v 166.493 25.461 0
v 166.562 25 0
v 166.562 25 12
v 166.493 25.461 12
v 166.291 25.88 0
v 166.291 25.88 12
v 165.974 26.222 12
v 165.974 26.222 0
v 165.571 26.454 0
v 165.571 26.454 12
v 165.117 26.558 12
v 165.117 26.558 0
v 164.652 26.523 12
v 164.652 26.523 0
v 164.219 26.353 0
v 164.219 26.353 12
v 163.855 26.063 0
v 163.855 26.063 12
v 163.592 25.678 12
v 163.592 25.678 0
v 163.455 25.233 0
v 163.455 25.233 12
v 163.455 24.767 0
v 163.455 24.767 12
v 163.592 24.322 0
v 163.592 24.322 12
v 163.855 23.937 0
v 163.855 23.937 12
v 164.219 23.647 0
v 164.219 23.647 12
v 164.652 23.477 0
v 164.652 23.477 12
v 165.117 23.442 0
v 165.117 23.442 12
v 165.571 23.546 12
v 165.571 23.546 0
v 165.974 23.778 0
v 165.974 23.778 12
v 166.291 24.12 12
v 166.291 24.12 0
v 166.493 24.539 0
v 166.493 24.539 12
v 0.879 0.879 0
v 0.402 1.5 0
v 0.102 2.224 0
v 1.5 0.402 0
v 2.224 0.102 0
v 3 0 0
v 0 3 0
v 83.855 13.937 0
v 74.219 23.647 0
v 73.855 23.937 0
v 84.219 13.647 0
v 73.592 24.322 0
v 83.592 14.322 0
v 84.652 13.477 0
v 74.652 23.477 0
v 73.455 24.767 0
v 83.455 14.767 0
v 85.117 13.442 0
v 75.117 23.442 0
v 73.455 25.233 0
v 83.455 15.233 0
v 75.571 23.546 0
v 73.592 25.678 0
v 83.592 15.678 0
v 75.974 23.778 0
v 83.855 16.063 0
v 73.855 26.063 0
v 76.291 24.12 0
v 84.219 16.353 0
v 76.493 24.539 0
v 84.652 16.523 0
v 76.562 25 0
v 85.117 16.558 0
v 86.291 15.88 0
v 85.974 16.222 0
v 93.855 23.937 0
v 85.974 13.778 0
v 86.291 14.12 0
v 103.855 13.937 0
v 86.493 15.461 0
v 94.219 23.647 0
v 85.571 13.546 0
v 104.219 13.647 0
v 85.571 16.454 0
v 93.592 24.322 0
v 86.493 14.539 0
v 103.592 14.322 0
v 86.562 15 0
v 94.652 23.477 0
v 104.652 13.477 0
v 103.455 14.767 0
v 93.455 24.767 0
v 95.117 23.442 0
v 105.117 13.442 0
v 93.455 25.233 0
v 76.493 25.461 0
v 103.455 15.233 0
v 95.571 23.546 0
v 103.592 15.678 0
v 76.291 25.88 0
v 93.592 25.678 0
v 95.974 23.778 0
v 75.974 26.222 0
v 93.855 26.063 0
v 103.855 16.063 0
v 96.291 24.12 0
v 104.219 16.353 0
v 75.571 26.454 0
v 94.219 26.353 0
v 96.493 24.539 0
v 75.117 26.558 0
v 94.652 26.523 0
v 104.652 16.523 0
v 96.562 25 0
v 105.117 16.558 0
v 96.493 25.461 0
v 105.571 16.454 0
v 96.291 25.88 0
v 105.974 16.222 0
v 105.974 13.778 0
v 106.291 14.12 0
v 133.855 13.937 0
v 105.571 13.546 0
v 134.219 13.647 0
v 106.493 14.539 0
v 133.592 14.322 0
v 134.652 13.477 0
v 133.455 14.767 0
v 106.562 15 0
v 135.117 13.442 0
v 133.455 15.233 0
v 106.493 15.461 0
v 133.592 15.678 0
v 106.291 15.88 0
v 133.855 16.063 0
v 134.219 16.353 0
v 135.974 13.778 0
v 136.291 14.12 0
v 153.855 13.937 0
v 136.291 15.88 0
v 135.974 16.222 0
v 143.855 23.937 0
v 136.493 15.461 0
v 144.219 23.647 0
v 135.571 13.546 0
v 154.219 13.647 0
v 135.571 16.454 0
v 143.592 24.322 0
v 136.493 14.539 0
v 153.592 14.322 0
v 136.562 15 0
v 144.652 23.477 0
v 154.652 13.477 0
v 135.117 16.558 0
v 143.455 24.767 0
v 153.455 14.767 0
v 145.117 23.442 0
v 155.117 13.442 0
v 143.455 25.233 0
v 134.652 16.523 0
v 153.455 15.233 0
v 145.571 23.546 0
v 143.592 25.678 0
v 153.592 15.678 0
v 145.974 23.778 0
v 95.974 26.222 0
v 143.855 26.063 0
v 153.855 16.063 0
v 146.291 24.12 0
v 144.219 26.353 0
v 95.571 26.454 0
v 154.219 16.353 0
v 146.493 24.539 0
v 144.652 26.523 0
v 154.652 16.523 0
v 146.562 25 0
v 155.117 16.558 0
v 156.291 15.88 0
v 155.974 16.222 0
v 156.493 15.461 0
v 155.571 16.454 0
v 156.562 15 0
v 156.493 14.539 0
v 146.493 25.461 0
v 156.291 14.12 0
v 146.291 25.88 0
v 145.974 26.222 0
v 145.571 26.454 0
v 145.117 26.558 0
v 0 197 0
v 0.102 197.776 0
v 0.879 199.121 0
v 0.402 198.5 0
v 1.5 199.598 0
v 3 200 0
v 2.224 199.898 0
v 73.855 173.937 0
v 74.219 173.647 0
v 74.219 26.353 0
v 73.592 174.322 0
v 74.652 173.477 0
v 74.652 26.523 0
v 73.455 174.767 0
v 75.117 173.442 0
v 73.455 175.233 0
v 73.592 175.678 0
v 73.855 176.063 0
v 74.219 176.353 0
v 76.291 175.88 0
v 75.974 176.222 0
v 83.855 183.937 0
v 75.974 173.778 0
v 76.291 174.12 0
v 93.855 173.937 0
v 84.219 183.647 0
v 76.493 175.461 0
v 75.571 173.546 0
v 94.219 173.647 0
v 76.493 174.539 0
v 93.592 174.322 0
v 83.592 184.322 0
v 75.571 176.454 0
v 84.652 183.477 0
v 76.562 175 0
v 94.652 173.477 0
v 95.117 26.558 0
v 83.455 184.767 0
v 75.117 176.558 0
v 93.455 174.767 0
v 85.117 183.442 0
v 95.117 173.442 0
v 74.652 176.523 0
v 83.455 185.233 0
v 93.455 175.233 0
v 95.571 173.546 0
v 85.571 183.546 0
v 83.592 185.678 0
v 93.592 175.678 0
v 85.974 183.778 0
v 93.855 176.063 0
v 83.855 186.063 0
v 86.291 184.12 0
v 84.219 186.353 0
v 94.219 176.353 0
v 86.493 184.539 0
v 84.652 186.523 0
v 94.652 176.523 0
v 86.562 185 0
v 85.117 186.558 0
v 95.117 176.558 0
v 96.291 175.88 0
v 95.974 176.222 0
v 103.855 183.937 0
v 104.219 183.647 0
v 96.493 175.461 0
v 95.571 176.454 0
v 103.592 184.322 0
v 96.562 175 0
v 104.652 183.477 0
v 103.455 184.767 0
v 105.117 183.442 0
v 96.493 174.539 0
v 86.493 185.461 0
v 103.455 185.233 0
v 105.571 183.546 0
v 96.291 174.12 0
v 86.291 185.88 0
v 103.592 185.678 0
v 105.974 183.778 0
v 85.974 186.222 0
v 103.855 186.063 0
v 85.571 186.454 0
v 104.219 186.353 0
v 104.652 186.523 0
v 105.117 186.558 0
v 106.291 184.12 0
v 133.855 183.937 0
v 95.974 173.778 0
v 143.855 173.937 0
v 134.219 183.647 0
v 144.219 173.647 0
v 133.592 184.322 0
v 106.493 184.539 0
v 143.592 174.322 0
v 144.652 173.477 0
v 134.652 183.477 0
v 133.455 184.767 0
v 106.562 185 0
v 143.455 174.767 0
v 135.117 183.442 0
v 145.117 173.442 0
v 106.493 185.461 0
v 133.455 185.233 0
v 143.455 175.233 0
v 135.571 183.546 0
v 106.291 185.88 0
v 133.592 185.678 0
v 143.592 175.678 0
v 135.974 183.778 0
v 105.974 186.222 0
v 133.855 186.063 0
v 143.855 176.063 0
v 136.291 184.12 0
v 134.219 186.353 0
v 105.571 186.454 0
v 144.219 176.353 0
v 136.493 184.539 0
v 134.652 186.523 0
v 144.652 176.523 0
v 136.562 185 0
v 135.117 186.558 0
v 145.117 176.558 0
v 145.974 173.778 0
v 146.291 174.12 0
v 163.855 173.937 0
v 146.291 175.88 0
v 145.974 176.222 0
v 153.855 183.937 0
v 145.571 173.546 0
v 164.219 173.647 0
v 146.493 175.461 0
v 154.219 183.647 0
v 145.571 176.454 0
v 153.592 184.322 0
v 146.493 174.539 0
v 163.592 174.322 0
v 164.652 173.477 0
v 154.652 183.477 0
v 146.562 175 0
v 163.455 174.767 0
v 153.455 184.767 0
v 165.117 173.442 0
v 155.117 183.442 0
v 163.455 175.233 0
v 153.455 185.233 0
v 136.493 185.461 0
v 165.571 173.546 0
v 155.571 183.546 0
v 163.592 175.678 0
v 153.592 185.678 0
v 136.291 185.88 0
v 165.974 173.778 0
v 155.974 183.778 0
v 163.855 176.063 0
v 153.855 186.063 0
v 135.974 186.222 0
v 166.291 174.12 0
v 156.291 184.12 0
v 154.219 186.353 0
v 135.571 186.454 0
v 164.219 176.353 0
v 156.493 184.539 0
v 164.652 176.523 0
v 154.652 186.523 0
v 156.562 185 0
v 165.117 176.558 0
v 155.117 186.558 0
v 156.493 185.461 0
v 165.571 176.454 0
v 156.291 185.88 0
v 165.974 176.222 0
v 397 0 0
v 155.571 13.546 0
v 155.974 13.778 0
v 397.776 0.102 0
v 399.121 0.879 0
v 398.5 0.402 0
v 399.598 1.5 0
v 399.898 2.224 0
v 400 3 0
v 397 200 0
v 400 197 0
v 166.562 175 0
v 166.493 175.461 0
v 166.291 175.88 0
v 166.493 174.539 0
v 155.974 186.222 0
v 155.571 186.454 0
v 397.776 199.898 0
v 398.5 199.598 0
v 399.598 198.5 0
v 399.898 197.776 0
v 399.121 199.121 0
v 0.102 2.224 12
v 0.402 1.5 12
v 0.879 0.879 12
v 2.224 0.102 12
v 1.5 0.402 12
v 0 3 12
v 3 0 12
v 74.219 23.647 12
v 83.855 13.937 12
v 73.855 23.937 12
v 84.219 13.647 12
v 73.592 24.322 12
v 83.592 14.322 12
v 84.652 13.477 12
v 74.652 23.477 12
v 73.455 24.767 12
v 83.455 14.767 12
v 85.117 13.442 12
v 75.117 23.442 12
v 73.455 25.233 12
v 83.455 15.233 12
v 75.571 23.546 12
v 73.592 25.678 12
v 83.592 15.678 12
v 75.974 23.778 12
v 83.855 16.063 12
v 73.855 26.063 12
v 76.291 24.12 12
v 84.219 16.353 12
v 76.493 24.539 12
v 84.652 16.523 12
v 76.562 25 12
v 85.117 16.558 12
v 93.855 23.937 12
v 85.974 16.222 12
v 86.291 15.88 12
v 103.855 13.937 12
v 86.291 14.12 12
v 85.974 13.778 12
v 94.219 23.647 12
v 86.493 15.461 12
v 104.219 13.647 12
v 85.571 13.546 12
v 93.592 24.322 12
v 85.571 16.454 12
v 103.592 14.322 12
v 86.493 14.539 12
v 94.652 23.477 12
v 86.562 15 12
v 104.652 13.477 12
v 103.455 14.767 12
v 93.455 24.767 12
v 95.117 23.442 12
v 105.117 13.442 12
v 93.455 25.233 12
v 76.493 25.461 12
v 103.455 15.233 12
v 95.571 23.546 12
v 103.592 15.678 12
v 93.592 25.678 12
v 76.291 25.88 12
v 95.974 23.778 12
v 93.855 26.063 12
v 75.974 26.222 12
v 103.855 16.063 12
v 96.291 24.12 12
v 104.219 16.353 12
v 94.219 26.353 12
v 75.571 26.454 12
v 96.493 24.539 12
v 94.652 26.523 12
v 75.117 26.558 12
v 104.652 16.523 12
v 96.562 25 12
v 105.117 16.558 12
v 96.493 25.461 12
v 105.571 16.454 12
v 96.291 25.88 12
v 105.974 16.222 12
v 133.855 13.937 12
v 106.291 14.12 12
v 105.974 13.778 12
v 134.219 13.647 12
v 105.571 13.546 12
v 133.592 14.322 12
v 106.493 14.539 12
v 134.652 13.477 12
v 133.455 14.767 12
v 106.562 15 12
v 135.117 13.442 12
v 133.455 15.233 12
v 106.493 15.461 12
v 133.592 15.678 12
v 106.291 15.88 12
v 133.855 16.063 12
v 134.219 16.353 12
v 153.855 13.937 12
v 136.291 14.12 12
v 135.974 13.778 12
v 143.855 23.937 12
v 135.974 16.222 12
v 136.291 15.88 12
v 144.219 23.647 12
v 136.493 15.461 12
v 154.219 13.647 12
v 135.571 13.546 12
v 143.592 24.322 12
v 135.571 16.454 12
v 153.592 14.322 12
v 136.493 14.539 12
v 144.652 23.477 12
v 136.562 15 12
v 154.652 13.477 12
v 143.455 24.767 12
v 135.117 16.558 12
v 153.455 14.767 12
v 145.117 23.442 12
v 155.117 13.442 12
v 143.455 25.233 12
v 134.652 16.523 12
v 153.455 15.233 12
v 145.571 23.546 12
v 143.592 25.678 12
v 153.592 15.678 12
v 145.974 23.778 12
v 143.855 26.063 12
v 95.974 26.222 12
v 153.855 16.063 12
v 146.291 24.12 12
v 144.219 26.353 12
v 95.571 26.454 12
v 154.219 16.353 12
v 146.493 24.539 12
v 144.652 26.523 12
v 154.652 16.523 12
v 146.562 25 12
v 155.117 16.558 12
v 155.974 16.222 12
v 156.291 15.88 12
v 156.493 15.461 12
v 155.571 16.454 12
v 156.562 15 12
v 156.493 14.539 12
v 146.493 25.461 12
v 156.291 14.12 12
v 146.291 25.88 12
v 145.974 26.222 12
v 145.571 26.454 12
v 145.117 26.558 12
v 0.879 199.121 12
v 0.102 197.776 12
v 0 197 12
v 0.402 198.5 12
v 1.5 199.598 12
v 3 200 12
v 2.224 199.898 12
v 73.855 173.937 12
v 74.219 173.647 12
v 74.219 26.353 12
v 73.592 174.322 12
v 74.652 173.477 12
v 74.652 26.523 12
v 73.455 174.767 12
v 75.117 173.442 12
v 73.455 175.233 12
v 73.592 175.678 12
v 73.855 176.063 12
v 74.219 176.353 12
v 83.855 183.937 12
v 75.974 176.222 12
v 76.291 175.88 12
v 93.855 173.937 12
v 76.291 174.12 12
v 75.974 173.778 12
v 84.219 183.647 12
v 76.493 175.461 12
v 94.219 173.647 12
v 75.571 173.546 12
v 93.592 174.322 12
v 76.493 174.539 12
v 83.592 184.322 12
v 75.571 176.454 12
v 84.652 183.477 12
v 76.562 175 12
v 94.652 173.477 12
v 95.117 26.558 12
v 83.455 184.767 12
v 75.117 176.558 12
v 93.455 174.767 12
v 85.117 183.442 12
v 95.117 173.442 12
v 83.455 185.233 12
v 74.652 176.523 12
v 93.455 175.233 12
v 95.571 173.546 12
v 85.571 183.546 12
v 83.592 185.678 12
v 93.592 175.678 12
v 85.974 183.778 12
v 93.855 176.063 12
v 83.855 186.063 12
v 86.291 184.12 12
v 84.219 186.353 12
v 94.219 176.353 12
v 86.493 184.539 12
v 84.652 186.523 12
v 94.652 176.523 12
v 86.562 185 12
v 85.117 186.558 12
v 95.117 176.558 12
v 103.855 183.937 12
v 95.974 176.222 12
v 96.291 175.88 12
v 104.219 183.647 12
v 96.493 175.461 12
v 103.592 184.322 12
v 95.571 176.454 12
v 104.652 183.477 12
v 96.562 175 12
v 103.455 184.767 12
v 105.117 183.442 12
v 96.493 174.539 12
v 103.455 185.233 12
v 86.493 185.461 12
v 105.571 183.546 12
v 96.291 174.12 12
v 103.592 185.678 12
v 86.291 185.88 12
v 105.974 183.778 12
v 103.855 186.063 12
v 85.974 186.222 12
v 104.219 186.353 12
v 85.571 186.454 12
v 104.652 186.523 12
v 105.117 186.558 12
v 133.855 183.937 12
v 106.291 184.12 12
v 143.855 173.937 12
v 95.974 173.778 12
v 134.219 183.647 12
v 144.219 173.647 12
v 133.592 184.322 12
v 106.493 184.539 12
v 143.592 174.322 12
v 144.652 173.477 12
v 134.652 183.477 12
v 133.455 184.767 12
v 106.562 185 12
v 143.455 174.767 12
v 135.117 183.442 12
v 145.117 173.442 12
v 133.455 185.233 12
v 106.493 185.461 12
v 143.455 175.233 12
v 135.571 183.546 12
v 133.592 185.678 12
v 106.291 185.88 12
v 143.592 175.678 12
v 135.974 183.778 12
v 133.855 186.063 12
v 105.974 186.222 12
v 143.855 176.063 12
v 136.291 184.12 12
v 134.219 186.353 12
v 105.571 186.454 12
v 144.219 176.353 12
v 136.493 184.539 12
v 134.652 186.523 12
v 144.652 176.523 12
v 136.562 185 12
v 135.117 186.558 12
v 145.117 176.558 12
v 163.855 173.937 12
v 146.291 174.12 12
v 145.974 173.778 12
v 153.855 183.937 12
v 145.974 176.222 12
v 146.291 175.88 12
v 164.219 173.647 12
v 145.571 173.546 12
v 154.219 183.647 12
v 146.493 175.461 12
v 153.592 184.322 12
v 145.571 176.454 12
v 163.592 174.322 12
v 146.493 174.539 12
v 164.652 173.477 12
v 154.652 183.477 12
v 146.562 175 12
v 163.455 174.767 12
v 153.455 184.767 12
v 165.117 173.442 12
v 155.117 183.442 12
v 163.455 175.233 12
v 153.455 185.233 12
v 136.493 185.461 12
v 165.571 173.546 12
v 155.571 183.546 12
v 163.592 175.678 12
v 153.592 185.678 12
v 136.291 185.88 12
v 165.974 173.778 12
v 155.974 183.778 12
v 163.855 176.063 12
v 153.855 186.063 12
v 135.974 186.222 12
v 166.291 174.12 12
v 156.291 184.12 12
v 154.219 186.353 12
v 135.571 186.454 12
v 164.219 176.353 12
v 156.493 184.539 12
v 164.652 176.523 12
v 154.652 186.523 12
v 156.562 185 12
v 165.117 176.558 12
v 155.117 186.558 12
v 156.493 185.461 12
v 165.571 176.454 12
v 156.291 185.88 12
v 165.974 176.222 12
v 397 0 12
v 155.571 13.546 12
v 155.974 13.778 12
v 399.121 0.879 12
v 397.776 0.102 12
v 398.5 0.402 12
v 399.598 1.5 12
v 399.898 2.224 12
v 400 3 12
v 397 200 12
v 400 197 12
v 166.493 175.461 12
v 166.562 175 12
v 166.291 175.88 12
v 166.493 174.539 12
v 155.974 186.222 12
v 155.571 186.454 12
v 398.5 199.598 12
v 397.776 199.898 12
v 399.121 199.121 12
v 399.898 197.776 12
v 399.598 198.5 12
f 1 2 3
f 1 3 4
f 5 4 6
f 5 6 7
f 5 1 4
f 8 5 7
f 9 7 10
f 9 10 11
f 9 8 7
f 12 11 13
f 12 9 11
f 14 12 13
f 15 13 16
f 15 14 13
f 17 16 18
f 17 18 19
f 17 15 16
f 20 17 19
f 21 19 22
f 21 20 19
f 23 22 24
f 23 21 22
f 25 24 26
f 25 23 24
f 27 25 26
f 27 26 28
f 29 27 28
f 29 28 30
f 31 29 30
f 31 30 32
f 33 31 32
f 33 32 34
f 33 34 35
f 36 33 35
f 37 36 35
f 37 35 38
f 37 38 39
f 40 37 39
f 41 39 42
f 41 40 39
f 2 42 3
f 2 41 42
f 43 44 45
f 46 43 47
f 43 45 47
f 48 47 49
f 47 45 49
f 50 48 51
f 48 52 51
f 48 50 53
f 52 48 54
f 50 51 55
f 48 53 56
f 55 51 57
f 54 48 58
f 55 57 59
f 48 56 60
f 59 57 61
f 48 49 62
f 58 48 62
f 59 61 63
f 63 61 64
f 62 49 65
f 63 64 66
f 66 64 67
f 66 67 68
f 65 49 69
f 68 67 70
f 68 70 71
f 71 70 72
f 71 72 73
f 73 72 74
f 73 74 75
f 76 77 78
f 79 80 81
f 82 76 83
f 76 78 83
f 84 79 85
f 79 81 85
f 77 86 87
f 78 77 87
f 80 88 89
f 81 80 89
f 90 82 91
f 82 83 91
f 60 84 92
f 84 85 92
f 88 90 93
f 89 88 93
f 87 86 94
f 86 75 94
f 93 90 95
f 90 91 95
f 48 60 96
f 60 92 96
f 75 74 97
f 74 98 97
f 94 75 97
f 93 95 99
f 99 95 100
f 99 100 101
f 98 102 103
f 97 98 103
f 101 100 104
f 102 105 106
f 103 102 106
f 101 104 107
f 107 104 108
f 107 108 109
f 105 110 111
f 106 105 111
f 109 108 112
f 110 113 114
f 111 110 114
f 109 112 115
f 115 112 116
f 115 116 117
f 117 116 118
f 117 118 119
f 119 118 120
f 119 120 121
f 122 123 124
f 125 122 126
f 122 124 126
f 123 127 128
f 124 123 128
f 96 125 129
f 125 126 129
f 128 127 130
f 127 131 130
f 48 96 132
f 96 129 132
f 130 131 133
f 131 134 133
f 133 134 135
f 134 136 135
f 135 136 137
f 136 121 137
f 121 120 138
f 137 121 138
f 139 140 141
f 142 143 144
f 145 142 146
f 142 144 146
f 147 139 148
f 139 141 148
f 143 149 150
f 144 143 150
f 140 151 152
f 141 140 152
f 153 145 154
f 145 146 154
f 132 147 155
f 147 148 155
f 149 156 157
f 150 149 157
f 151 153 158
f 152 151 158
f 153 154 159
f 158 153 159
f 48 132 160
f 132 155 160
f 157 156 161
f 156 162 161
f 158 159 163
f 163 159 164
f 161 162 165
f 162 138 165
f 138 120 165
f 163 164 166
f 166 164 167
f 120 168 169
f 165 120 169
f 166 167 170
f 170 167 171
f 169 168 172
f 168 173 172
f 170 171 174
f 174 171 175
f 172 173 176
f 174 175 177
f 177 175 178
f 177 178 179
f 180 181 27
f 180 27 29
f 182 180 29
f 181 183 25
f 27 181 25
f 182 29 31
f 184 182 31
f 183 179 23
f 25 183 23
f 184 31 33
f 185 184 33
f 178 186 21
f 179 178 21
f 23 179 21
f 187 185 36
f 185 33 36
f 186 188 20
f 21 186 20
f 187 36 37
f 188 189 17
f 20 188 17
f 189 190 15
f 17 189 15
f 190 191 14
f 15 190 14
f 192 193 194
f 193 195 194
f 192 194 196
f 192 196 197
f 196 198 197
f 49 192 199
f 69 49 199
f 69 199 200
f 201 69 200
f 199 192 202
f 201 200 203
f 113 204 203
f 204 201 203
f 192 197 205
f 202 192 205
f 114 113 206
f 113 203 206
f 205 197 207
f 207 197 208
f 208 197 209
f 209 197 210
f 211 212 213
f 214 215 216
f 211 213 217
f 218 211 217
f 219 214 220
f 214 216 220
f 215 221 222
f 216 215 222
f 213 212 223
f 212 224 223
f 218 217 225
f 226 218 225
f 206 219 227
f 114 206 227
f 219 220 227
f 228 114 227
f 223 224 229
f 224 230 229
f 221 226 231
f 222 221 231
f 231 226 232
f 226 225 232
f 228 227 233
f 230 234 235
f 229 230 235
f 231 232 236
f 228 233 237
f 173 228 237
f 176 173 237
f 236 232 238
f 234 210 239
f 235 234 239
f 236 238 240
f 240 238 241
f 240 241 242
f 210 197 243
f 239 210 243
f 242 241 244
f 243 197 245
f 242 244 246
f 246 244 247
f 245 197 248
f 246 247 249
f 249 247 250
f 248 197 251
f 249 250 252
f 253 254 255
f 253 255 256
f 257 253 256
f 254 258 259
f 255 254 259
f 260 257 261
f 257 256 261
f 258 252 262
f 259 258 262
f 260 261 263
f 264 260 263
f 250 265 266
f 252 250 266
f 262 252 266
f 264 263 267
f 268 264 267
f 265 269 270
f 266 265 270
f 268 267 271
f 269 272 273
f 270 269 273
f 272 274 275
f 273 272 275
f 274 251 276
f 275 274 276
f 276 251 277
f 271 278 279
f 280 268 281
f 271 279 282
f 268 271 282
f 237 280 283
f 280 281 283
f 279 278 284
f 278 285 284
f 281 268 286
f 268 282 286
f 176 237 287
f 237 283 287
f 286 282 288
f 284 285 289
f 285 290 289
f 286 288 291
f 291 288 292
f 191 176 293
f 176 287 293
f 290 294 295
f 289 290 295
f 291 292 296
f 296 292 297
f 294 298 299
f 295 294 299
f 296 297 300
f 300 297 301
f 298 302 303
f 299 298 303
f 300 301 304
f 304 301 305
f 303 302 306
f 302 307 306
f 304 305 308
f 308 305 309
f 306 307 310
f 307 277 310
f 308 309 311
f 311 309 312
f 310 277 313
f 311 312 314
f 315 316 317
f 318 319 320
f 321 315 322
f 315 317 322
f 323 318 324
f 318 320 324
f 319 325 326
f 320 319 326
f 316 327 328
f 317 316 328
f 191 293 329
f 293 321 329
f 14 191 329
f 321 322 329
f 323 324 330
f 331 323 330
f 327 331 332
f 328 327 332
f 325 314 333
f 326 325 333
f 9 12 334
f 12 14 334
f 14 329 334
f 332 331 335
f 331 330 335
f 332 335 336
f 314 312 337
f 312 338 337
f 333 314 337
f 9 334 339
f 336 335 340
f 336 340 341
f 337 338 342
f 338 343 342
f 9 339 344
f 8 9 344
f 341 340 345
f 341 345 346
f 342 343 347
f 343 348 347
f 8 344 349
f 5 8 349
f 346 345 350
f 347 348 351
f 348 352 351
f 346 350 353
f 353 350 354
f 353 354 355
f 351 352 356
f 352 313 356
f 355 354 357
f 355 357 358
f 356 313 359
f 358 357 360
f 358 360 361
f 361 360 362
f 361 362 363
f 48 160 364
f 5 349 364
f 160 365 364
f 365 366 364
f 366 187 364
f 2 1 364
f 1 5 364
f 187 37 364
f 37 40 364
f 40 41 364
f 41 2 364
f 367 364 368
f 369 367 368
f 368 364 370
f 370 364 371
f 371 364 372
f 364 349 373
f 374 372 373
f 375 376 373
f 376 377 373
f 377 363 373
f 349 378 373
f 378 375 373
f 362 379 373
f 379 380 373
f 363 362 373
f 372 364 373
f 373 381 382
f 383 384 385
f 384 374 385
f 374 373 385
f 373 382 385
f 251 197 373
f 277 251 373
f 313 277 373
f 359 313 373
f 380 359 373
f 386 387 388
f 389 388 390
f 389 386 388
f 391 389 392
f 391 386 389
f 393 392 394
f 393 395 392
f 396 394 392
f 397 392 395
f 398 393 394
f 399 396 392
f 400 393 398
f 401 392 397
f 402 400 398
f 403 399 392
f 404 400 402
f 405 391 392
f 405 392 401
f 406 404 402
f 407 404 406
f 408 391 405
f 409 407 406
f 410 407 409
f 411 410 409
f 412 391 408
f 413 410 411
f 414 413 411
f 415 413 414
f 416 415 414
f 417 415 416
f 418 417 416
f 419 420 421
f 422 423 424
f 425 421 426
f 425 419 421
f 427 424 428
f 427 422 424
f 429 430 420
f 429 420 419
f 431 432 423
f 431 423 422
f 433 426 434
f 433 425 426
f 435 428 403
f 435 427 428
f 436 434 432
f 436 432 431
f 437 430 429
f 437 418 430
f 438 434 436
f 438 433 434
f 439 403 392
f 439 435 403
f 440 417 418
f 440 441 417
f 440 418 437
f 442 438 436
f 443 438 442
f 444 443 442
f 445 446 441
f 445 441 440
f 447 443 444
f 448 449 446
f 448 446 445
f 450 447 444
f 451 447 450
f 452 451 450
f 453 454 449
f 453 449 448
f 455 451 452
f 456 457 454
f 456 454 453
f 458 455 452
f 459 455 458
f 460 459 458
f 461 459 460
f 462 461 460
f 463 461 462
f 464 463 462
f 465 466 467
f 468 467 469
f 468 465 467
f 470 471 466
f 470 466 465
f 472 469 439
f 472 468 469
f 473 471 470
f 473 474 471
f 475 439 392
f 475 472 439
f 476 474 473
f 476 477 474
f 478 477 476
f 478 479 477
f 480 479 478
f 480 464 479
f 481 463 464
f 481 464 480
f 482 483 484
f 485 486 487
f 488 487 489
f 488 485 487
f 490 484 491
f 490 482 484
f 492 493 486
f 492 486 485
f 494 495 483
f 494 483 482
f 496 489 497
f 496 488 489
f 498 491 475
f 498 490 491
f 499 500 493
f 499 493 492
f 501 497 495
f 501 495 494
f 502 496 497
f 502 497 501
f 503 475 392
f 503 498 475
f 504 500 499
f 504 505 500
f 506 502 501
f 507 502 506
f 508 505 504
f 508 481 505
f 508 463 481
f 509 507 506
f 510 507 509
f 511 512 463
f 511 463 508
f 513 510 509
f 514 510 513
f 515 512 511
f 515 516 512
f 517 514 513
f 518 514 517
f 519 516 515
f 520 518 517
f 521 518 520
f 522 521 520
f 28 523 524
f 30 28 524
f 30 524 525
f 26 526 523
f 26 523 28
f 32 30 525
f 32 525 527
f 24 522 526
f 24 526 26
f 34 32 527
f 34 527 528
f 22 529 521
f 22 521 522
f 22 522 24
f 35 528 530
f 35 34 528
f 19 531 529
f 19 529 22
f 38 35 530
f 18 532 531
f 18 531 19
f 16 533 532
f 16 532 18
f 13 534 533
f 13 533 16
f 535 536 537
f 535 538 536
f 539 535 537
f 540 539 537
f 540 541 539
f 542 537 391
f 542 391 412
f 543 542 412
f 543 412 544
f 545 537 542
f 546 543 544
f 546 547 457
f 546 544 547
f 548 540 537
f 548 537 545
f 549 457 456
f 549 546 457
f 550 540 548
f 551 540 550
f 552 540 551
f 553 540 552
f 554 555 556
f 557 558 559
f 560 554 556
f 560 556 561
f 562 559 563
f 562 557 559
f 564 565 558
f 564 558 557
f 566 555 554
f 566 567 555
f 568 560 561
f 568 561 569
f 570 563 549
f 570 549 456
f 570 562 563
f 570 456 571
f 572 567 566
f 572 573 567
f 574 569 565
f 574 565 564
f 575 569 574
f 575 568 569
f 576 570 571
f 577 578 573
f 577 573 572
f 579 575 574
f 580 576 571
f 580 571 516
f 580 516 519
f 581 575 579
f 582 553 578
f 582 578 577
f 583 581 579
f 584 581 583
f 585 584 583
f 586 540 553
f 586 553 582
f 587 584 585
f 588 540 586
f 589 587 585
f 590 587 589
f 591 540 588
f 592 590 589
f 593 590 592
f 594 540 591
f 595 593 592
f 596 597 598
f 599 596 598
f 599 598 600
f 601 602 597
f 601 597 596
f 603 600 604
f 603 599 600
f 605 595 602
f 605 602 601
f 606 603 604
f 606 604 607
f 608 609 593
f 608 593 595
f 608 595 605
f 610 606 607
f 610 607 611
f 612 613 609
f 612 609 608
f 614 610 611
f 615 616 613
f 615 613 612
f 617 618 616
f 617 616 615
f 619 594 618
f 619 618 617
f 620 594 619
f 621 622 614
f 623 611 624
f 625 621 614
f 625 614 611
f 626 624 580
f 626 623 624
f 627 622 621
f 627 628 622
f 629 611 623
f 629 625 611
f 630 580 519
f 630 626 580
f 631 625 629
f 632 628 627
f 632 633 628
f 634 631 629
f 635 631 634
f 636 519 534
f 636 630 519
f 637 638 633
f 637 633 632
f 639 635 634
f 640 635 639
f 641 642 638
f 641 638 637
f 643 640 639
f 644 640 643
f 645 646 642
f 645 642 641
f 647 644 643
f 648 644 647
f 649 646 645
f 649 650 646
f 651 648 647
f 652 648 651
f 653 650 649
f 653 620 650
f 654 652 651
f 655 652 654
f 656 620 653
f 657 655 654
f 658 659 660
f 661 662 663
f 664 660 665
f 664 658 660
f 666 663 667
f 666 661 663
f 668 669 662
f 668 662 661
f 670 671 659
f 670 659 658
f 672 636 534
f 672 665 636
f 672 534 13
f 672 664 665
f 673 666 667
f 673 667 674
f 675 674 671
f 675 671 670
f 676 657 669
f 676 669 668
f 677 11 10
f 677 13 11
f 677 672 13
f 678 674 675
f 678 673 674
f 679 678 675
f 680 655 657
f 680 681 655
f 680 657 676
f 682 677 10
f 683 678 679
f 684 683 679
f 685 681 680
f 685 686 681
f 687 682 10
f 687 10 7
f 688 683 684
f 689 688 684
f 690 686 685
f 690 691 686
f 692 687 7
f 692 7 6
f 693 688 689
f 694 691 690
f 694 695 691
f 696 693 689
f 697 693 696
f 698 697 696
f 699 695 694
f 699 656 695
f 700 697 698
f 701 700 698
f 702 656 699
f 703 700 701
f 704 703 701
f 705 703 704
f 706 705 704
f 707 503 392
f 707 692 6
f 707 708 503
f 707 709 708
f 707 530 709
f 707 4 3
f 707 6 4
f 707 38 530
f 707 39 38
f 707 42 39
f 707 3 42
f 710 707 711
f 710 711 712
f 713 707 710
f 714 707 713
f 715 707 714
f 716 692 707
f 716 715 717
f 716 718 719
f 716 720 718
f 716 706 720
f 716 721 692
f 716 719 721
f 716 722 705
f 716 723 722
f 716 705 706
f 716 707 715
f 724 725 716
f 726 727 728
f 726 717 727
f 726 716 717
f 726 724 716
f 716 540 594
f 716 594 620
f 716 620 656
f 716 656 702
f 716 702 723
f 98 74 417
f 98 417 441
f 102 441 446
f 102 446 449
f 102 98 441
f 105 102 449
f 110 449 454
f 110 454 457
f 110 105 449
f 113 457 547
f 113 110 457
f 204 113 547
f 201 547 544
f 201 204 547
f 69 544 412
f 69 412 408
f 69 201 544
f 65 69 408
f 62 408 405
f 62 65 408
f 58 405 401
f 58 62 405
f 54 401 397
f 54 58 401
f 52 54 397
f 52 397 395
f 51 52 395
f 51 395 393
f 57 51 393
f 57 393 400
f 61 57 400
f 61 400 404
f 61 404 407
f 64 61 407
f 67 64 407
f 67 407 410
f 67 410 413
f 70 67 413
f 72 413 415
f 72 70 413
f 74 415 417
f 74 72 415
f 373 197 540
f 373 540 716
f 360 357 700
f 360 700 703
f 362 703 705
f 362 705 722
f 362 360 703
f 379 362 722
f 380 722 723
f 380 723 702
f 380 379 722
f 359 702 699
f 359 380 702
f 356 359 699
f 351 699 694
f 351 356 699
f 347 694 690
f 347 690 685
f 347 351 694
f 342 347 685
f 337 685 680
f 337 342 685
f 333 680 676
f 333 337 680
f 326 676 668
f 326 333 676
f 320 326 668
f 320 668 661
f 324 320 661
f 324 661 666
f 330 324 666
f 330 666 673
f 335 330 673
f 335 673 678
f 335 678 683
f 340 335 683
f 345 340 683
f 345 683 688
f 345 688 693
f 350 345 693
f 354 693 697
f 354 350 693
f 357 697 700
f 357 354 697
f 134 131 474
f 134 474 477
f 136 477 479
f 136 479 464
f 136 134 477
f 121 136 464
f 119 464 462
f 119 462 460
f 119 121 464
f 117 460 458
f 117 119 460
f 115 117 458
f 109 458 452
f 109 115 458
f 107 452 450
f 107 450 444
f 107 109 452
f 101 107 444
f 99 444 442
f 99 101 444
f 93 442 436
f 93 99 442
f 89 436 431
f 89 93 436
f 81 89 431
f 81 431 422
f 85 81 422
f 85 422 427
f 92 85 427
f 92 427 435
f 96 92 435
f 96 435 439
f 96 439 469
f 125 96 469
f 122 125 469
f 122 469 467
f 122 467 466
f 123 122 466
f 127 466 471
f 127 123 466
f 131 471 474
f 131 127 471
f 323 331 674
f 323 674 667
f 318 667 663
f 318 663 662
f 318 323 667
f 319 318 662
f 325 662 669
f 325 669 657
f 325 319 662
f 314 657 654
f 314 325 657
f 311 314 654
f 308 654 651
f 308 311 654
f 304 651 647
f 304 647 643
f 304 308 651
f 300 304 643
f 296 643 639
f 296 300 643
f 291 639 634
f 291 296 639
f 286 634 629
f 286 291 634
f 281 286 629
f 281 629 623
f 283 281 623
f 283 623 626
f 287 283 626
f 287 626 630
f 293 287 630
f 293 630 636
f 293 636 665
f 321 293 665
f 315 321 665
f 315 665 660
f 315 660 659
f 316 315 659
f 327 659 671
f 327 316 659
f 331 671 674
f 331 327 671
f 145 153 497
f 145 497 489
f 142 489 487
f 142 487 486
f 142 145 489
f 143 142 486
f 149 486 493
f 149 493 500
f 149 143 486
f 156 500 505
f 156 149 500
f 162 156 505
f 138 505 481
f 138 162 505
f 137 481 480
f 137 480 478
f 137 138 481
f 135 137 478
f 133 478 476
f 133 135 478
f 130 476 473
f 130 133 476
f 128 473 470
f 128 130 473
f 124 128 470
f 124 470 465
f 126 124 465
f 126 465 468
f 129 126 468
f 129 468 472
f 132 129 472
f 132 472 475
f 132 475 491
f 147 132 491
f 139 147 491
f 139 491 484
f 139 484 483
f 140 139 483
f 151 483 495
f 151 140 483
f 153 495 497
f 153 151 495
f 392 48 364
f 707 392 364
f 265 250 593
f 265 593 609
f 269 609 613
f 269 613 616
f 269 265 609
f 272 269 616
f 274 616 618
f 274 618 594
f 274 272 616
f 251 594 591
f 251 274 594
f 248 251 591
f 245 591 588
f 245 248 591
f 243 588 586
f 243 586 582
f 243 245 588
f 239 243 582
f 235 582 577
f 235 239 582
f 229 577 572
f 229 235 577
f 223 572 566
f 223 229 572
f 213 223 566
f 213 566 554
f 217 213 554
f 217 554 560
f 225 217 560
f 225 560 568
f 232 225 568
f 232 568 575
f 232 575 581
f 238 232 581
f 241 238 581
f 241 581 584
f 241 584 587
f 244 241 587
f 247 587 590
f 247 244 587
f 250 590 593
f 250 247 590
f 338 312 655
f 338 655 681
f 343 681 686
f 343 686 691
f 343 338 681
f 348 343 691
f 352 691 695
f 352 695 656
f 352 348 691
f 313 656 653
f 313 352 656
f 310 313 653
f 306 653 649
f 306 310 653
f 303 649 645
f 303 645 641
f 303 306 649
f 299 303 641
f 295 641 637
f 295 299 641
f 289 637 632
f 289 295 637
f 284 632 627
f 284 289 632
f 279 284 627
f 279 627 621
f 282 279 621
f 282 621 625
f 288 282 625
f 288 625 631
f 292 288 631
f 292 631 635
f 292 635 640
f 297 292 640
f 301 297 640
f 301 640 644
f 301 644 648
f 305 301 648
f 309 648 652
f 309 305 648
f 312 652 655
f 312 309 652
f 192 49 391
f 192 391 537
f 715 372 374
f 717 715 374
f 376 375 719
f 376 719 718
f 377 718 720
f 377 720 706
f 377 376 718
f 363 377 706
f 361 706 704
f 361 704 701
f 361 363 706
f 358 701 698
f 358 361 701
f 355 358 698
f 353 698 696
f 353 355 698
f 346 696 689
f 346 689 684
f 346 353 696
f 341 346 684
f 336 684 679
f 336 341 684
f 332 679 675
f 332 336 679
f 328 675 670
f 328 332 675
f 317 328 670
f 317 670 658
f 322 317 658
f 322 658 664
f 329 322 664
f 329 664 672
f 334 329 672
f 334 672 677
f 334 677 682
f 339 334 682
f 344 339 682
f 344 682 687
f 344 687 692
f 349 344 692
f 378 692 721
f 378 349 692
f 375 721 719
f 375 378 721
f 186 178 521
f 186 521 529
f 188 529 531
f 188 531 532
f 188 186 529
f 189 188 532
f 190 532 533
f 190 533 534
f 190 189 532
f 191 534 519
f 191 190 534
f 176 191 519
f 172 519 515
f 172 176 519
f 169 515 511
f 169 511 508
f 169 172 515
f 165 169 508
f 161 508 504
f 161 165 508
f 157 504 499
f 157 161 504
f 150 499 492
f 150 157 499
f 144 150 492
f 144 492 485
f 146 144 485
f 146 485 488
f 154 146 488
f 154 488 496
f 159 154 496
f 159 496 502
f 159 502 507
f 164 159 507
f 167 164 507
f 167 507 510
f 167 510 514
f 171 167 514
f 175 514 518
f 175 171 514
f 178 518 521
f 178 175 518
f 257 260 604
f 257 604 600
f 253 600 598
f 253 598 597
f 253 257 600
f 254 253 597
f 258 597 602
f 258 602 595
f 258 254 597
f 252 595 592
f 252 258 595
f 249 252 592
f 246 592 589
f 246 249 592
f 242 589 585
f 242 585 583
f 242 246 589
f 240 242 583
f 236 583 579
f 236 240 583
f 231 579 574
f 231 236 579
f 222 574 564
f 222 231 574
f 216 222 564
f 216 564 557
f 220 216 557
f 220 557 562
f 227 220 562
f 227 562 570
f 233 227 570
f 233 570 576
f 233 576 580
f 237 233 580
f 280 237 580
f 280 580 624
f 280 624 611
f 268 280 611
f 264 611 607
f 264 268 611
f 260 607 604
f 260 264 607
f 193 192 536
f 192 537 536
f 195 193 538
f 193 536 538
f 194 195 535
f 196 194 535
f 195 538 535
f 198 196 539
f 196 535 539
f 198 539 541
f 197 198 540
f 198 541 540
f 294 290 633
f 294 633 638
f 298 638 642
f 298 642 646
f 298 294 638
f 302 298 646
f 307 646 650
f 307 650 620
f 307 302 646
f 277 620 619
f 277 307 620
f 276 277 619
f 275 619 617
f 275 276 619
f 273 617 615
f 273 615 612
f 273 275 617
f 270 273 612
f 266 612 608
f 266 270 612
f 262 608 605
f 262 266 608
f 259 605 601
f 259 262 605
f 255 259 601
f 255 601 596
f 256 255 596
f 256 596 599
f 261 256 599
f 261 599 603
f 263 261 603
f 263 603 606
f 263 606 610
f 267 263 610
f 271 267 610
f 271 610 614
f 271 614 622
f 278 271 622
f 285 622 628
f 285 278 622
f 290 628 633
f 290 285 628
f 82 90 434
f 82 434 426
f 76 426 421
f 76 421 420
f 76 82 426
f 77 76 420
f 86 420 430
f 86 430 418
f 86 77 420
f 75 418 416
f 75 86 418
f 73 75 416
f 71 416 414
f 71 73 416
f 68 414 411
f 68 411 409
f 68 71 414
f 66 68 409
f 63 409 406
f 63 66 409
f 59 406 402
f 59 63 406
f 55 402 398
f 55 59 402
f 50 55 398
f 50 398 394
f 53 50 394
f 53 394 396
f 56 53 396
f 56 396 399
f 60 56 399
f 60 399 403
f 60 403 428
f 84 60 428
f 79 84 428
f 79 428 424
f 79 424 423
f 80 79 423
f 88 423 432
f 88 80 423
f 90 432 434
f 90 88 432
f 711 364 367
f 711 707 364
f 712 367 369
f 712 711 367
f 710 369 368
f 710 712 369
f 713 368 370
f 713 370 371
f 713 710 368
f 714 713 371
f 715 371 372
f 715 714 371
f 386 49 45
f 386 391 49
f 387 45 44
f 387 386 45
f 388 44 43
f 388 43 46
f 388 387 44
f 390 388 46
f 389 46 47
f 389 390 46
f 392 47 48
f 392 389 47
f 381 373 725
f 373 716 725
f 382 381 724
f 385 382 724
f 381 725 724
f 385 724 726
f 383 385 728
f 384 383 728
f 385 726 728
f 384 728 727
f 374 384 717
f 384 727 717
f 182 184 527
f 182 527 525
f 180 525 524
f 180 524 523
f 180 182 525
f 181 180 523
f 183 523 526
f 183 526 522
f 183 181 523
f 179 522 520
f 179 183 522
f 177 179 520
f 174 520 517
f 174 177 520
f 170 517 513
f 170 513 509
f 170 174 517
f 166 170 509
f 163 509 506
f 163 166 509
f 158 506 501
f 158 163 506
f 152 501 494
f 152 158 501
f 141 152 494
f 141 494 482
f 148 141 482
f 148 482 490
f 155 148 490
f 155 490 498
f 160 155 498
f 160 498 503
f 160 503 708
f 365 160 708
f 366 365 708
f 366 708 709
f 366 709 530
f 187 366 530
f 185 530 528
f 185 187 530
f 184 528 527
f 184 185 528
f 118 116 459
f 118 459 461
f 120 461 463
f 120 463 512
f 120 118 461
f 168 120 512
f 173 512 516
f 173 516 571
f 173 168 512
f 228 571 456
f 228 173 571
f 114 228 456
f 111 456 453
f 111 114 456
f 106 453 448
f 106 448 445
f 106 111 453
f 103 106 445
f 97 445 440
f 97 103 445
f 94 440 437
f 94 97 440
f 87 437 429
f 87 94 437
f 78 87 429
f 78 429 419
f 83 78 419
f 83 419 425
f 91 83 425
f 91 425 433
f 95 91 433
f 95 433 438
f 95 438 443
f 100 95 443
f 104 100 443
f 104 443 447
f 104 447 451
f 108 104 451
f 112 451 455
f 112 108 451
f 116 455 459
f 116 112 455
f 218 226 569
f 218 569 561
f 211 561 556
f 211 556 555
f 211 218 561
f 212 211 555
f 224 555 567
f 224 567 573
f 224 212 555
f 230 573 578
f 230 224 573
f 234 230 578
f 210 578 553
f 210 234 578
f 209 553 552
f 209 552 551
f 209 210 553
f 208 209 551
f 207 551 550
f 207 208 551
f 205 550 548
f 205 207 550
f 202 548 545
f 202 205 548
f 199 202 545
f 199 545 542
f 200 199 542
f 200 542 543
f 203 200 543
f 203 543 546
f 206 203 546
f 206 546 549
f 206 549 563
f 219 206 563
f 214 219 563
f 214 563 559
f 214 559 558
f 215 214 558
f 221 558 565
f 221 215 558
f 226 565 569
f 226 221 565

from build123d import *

# Parameters (mm, degrees)
SKETCH_W  = 400
SKETCH_H  = 200
SKETCH_R  = 1.5625
PAD_DEPTH = 12
FILLET_R  = 3


with BuildPart() as part:
    # Sketch → Pad (new body)
    with BuildSketch(Plane.XY):
        with Locations((200, 100)):
            Rectangle(SKETCH_W, SKETCH_H)
        with Locations((85, 15)):
            Circle(SKETCH_R, mode=Mode.SUBTRACT)
        with Locations((105, 15)):
            Circle(SKETCH_R, mode=Mode.SUBTRACT)
        with Locations((75, 25)):
            Circle(SKETCH_R, mode=Mode.SUBTRACT)
        with Locations((95, 25)):
            Circle(SKETCH_R, mode=Mode.SUBTRACT)
        with Locations((155, 15)):
            Circle(SKETCH_R, mode=Mode.SUBTRACT)
        with Locations((135, 15)):
            Circle(SKETCH_R, mode=Mode.SUBTRACT)
        with Locations((145, 25)):
            Circle(SKETCH_R, mode=Mode.SUBTRACT)
        with Locations((165, 25)):
            Circle(SKETCH_R, mode=Mode.SUBTRACT)
        with Locations((85, 185)):
            Circle(SKETCH_R, mode=Mode.SUBTRACT)
        with Locations((105, 185)):
            Circle(SKETCH_R, mode=Mode.SUBTRACT)
        with Locations((75, 175)):
            Circle(SKETCH_R, mode=Mode.SUBTRACT)
        with Locations((95, 175)):
            Circle(SKETCH_R, mode=Mode.SUBTRACT)
        with Locations((155, 185)):
            Circle(SKETCH_R, mode=Mode.SUBTRACT)
        with Locations((135, 185)):
            Circle(SKETCH_R, mode=Mode.SUBTRACT)
        with Locations((145, 175)):
            Circle(SKETCH_R, mode=Mode.SUBTRACT)
        with Locations((165, 175)):
            Circle(SKETCH_R, mode=Mode.SUBTRACT)
    extrude(amount=PAD_DEPTH)

    # Fillet
    fillet_edges = [part.edges().sort_by_distance(p)[0] for p in [
        (0, 0, 6),
        (400, 0, 6),
        (400, 200, 6),
        (0, 200, 6),
    ]]
    fillet(fillet_edges, radius=FILLET_R)


solid = part.part
